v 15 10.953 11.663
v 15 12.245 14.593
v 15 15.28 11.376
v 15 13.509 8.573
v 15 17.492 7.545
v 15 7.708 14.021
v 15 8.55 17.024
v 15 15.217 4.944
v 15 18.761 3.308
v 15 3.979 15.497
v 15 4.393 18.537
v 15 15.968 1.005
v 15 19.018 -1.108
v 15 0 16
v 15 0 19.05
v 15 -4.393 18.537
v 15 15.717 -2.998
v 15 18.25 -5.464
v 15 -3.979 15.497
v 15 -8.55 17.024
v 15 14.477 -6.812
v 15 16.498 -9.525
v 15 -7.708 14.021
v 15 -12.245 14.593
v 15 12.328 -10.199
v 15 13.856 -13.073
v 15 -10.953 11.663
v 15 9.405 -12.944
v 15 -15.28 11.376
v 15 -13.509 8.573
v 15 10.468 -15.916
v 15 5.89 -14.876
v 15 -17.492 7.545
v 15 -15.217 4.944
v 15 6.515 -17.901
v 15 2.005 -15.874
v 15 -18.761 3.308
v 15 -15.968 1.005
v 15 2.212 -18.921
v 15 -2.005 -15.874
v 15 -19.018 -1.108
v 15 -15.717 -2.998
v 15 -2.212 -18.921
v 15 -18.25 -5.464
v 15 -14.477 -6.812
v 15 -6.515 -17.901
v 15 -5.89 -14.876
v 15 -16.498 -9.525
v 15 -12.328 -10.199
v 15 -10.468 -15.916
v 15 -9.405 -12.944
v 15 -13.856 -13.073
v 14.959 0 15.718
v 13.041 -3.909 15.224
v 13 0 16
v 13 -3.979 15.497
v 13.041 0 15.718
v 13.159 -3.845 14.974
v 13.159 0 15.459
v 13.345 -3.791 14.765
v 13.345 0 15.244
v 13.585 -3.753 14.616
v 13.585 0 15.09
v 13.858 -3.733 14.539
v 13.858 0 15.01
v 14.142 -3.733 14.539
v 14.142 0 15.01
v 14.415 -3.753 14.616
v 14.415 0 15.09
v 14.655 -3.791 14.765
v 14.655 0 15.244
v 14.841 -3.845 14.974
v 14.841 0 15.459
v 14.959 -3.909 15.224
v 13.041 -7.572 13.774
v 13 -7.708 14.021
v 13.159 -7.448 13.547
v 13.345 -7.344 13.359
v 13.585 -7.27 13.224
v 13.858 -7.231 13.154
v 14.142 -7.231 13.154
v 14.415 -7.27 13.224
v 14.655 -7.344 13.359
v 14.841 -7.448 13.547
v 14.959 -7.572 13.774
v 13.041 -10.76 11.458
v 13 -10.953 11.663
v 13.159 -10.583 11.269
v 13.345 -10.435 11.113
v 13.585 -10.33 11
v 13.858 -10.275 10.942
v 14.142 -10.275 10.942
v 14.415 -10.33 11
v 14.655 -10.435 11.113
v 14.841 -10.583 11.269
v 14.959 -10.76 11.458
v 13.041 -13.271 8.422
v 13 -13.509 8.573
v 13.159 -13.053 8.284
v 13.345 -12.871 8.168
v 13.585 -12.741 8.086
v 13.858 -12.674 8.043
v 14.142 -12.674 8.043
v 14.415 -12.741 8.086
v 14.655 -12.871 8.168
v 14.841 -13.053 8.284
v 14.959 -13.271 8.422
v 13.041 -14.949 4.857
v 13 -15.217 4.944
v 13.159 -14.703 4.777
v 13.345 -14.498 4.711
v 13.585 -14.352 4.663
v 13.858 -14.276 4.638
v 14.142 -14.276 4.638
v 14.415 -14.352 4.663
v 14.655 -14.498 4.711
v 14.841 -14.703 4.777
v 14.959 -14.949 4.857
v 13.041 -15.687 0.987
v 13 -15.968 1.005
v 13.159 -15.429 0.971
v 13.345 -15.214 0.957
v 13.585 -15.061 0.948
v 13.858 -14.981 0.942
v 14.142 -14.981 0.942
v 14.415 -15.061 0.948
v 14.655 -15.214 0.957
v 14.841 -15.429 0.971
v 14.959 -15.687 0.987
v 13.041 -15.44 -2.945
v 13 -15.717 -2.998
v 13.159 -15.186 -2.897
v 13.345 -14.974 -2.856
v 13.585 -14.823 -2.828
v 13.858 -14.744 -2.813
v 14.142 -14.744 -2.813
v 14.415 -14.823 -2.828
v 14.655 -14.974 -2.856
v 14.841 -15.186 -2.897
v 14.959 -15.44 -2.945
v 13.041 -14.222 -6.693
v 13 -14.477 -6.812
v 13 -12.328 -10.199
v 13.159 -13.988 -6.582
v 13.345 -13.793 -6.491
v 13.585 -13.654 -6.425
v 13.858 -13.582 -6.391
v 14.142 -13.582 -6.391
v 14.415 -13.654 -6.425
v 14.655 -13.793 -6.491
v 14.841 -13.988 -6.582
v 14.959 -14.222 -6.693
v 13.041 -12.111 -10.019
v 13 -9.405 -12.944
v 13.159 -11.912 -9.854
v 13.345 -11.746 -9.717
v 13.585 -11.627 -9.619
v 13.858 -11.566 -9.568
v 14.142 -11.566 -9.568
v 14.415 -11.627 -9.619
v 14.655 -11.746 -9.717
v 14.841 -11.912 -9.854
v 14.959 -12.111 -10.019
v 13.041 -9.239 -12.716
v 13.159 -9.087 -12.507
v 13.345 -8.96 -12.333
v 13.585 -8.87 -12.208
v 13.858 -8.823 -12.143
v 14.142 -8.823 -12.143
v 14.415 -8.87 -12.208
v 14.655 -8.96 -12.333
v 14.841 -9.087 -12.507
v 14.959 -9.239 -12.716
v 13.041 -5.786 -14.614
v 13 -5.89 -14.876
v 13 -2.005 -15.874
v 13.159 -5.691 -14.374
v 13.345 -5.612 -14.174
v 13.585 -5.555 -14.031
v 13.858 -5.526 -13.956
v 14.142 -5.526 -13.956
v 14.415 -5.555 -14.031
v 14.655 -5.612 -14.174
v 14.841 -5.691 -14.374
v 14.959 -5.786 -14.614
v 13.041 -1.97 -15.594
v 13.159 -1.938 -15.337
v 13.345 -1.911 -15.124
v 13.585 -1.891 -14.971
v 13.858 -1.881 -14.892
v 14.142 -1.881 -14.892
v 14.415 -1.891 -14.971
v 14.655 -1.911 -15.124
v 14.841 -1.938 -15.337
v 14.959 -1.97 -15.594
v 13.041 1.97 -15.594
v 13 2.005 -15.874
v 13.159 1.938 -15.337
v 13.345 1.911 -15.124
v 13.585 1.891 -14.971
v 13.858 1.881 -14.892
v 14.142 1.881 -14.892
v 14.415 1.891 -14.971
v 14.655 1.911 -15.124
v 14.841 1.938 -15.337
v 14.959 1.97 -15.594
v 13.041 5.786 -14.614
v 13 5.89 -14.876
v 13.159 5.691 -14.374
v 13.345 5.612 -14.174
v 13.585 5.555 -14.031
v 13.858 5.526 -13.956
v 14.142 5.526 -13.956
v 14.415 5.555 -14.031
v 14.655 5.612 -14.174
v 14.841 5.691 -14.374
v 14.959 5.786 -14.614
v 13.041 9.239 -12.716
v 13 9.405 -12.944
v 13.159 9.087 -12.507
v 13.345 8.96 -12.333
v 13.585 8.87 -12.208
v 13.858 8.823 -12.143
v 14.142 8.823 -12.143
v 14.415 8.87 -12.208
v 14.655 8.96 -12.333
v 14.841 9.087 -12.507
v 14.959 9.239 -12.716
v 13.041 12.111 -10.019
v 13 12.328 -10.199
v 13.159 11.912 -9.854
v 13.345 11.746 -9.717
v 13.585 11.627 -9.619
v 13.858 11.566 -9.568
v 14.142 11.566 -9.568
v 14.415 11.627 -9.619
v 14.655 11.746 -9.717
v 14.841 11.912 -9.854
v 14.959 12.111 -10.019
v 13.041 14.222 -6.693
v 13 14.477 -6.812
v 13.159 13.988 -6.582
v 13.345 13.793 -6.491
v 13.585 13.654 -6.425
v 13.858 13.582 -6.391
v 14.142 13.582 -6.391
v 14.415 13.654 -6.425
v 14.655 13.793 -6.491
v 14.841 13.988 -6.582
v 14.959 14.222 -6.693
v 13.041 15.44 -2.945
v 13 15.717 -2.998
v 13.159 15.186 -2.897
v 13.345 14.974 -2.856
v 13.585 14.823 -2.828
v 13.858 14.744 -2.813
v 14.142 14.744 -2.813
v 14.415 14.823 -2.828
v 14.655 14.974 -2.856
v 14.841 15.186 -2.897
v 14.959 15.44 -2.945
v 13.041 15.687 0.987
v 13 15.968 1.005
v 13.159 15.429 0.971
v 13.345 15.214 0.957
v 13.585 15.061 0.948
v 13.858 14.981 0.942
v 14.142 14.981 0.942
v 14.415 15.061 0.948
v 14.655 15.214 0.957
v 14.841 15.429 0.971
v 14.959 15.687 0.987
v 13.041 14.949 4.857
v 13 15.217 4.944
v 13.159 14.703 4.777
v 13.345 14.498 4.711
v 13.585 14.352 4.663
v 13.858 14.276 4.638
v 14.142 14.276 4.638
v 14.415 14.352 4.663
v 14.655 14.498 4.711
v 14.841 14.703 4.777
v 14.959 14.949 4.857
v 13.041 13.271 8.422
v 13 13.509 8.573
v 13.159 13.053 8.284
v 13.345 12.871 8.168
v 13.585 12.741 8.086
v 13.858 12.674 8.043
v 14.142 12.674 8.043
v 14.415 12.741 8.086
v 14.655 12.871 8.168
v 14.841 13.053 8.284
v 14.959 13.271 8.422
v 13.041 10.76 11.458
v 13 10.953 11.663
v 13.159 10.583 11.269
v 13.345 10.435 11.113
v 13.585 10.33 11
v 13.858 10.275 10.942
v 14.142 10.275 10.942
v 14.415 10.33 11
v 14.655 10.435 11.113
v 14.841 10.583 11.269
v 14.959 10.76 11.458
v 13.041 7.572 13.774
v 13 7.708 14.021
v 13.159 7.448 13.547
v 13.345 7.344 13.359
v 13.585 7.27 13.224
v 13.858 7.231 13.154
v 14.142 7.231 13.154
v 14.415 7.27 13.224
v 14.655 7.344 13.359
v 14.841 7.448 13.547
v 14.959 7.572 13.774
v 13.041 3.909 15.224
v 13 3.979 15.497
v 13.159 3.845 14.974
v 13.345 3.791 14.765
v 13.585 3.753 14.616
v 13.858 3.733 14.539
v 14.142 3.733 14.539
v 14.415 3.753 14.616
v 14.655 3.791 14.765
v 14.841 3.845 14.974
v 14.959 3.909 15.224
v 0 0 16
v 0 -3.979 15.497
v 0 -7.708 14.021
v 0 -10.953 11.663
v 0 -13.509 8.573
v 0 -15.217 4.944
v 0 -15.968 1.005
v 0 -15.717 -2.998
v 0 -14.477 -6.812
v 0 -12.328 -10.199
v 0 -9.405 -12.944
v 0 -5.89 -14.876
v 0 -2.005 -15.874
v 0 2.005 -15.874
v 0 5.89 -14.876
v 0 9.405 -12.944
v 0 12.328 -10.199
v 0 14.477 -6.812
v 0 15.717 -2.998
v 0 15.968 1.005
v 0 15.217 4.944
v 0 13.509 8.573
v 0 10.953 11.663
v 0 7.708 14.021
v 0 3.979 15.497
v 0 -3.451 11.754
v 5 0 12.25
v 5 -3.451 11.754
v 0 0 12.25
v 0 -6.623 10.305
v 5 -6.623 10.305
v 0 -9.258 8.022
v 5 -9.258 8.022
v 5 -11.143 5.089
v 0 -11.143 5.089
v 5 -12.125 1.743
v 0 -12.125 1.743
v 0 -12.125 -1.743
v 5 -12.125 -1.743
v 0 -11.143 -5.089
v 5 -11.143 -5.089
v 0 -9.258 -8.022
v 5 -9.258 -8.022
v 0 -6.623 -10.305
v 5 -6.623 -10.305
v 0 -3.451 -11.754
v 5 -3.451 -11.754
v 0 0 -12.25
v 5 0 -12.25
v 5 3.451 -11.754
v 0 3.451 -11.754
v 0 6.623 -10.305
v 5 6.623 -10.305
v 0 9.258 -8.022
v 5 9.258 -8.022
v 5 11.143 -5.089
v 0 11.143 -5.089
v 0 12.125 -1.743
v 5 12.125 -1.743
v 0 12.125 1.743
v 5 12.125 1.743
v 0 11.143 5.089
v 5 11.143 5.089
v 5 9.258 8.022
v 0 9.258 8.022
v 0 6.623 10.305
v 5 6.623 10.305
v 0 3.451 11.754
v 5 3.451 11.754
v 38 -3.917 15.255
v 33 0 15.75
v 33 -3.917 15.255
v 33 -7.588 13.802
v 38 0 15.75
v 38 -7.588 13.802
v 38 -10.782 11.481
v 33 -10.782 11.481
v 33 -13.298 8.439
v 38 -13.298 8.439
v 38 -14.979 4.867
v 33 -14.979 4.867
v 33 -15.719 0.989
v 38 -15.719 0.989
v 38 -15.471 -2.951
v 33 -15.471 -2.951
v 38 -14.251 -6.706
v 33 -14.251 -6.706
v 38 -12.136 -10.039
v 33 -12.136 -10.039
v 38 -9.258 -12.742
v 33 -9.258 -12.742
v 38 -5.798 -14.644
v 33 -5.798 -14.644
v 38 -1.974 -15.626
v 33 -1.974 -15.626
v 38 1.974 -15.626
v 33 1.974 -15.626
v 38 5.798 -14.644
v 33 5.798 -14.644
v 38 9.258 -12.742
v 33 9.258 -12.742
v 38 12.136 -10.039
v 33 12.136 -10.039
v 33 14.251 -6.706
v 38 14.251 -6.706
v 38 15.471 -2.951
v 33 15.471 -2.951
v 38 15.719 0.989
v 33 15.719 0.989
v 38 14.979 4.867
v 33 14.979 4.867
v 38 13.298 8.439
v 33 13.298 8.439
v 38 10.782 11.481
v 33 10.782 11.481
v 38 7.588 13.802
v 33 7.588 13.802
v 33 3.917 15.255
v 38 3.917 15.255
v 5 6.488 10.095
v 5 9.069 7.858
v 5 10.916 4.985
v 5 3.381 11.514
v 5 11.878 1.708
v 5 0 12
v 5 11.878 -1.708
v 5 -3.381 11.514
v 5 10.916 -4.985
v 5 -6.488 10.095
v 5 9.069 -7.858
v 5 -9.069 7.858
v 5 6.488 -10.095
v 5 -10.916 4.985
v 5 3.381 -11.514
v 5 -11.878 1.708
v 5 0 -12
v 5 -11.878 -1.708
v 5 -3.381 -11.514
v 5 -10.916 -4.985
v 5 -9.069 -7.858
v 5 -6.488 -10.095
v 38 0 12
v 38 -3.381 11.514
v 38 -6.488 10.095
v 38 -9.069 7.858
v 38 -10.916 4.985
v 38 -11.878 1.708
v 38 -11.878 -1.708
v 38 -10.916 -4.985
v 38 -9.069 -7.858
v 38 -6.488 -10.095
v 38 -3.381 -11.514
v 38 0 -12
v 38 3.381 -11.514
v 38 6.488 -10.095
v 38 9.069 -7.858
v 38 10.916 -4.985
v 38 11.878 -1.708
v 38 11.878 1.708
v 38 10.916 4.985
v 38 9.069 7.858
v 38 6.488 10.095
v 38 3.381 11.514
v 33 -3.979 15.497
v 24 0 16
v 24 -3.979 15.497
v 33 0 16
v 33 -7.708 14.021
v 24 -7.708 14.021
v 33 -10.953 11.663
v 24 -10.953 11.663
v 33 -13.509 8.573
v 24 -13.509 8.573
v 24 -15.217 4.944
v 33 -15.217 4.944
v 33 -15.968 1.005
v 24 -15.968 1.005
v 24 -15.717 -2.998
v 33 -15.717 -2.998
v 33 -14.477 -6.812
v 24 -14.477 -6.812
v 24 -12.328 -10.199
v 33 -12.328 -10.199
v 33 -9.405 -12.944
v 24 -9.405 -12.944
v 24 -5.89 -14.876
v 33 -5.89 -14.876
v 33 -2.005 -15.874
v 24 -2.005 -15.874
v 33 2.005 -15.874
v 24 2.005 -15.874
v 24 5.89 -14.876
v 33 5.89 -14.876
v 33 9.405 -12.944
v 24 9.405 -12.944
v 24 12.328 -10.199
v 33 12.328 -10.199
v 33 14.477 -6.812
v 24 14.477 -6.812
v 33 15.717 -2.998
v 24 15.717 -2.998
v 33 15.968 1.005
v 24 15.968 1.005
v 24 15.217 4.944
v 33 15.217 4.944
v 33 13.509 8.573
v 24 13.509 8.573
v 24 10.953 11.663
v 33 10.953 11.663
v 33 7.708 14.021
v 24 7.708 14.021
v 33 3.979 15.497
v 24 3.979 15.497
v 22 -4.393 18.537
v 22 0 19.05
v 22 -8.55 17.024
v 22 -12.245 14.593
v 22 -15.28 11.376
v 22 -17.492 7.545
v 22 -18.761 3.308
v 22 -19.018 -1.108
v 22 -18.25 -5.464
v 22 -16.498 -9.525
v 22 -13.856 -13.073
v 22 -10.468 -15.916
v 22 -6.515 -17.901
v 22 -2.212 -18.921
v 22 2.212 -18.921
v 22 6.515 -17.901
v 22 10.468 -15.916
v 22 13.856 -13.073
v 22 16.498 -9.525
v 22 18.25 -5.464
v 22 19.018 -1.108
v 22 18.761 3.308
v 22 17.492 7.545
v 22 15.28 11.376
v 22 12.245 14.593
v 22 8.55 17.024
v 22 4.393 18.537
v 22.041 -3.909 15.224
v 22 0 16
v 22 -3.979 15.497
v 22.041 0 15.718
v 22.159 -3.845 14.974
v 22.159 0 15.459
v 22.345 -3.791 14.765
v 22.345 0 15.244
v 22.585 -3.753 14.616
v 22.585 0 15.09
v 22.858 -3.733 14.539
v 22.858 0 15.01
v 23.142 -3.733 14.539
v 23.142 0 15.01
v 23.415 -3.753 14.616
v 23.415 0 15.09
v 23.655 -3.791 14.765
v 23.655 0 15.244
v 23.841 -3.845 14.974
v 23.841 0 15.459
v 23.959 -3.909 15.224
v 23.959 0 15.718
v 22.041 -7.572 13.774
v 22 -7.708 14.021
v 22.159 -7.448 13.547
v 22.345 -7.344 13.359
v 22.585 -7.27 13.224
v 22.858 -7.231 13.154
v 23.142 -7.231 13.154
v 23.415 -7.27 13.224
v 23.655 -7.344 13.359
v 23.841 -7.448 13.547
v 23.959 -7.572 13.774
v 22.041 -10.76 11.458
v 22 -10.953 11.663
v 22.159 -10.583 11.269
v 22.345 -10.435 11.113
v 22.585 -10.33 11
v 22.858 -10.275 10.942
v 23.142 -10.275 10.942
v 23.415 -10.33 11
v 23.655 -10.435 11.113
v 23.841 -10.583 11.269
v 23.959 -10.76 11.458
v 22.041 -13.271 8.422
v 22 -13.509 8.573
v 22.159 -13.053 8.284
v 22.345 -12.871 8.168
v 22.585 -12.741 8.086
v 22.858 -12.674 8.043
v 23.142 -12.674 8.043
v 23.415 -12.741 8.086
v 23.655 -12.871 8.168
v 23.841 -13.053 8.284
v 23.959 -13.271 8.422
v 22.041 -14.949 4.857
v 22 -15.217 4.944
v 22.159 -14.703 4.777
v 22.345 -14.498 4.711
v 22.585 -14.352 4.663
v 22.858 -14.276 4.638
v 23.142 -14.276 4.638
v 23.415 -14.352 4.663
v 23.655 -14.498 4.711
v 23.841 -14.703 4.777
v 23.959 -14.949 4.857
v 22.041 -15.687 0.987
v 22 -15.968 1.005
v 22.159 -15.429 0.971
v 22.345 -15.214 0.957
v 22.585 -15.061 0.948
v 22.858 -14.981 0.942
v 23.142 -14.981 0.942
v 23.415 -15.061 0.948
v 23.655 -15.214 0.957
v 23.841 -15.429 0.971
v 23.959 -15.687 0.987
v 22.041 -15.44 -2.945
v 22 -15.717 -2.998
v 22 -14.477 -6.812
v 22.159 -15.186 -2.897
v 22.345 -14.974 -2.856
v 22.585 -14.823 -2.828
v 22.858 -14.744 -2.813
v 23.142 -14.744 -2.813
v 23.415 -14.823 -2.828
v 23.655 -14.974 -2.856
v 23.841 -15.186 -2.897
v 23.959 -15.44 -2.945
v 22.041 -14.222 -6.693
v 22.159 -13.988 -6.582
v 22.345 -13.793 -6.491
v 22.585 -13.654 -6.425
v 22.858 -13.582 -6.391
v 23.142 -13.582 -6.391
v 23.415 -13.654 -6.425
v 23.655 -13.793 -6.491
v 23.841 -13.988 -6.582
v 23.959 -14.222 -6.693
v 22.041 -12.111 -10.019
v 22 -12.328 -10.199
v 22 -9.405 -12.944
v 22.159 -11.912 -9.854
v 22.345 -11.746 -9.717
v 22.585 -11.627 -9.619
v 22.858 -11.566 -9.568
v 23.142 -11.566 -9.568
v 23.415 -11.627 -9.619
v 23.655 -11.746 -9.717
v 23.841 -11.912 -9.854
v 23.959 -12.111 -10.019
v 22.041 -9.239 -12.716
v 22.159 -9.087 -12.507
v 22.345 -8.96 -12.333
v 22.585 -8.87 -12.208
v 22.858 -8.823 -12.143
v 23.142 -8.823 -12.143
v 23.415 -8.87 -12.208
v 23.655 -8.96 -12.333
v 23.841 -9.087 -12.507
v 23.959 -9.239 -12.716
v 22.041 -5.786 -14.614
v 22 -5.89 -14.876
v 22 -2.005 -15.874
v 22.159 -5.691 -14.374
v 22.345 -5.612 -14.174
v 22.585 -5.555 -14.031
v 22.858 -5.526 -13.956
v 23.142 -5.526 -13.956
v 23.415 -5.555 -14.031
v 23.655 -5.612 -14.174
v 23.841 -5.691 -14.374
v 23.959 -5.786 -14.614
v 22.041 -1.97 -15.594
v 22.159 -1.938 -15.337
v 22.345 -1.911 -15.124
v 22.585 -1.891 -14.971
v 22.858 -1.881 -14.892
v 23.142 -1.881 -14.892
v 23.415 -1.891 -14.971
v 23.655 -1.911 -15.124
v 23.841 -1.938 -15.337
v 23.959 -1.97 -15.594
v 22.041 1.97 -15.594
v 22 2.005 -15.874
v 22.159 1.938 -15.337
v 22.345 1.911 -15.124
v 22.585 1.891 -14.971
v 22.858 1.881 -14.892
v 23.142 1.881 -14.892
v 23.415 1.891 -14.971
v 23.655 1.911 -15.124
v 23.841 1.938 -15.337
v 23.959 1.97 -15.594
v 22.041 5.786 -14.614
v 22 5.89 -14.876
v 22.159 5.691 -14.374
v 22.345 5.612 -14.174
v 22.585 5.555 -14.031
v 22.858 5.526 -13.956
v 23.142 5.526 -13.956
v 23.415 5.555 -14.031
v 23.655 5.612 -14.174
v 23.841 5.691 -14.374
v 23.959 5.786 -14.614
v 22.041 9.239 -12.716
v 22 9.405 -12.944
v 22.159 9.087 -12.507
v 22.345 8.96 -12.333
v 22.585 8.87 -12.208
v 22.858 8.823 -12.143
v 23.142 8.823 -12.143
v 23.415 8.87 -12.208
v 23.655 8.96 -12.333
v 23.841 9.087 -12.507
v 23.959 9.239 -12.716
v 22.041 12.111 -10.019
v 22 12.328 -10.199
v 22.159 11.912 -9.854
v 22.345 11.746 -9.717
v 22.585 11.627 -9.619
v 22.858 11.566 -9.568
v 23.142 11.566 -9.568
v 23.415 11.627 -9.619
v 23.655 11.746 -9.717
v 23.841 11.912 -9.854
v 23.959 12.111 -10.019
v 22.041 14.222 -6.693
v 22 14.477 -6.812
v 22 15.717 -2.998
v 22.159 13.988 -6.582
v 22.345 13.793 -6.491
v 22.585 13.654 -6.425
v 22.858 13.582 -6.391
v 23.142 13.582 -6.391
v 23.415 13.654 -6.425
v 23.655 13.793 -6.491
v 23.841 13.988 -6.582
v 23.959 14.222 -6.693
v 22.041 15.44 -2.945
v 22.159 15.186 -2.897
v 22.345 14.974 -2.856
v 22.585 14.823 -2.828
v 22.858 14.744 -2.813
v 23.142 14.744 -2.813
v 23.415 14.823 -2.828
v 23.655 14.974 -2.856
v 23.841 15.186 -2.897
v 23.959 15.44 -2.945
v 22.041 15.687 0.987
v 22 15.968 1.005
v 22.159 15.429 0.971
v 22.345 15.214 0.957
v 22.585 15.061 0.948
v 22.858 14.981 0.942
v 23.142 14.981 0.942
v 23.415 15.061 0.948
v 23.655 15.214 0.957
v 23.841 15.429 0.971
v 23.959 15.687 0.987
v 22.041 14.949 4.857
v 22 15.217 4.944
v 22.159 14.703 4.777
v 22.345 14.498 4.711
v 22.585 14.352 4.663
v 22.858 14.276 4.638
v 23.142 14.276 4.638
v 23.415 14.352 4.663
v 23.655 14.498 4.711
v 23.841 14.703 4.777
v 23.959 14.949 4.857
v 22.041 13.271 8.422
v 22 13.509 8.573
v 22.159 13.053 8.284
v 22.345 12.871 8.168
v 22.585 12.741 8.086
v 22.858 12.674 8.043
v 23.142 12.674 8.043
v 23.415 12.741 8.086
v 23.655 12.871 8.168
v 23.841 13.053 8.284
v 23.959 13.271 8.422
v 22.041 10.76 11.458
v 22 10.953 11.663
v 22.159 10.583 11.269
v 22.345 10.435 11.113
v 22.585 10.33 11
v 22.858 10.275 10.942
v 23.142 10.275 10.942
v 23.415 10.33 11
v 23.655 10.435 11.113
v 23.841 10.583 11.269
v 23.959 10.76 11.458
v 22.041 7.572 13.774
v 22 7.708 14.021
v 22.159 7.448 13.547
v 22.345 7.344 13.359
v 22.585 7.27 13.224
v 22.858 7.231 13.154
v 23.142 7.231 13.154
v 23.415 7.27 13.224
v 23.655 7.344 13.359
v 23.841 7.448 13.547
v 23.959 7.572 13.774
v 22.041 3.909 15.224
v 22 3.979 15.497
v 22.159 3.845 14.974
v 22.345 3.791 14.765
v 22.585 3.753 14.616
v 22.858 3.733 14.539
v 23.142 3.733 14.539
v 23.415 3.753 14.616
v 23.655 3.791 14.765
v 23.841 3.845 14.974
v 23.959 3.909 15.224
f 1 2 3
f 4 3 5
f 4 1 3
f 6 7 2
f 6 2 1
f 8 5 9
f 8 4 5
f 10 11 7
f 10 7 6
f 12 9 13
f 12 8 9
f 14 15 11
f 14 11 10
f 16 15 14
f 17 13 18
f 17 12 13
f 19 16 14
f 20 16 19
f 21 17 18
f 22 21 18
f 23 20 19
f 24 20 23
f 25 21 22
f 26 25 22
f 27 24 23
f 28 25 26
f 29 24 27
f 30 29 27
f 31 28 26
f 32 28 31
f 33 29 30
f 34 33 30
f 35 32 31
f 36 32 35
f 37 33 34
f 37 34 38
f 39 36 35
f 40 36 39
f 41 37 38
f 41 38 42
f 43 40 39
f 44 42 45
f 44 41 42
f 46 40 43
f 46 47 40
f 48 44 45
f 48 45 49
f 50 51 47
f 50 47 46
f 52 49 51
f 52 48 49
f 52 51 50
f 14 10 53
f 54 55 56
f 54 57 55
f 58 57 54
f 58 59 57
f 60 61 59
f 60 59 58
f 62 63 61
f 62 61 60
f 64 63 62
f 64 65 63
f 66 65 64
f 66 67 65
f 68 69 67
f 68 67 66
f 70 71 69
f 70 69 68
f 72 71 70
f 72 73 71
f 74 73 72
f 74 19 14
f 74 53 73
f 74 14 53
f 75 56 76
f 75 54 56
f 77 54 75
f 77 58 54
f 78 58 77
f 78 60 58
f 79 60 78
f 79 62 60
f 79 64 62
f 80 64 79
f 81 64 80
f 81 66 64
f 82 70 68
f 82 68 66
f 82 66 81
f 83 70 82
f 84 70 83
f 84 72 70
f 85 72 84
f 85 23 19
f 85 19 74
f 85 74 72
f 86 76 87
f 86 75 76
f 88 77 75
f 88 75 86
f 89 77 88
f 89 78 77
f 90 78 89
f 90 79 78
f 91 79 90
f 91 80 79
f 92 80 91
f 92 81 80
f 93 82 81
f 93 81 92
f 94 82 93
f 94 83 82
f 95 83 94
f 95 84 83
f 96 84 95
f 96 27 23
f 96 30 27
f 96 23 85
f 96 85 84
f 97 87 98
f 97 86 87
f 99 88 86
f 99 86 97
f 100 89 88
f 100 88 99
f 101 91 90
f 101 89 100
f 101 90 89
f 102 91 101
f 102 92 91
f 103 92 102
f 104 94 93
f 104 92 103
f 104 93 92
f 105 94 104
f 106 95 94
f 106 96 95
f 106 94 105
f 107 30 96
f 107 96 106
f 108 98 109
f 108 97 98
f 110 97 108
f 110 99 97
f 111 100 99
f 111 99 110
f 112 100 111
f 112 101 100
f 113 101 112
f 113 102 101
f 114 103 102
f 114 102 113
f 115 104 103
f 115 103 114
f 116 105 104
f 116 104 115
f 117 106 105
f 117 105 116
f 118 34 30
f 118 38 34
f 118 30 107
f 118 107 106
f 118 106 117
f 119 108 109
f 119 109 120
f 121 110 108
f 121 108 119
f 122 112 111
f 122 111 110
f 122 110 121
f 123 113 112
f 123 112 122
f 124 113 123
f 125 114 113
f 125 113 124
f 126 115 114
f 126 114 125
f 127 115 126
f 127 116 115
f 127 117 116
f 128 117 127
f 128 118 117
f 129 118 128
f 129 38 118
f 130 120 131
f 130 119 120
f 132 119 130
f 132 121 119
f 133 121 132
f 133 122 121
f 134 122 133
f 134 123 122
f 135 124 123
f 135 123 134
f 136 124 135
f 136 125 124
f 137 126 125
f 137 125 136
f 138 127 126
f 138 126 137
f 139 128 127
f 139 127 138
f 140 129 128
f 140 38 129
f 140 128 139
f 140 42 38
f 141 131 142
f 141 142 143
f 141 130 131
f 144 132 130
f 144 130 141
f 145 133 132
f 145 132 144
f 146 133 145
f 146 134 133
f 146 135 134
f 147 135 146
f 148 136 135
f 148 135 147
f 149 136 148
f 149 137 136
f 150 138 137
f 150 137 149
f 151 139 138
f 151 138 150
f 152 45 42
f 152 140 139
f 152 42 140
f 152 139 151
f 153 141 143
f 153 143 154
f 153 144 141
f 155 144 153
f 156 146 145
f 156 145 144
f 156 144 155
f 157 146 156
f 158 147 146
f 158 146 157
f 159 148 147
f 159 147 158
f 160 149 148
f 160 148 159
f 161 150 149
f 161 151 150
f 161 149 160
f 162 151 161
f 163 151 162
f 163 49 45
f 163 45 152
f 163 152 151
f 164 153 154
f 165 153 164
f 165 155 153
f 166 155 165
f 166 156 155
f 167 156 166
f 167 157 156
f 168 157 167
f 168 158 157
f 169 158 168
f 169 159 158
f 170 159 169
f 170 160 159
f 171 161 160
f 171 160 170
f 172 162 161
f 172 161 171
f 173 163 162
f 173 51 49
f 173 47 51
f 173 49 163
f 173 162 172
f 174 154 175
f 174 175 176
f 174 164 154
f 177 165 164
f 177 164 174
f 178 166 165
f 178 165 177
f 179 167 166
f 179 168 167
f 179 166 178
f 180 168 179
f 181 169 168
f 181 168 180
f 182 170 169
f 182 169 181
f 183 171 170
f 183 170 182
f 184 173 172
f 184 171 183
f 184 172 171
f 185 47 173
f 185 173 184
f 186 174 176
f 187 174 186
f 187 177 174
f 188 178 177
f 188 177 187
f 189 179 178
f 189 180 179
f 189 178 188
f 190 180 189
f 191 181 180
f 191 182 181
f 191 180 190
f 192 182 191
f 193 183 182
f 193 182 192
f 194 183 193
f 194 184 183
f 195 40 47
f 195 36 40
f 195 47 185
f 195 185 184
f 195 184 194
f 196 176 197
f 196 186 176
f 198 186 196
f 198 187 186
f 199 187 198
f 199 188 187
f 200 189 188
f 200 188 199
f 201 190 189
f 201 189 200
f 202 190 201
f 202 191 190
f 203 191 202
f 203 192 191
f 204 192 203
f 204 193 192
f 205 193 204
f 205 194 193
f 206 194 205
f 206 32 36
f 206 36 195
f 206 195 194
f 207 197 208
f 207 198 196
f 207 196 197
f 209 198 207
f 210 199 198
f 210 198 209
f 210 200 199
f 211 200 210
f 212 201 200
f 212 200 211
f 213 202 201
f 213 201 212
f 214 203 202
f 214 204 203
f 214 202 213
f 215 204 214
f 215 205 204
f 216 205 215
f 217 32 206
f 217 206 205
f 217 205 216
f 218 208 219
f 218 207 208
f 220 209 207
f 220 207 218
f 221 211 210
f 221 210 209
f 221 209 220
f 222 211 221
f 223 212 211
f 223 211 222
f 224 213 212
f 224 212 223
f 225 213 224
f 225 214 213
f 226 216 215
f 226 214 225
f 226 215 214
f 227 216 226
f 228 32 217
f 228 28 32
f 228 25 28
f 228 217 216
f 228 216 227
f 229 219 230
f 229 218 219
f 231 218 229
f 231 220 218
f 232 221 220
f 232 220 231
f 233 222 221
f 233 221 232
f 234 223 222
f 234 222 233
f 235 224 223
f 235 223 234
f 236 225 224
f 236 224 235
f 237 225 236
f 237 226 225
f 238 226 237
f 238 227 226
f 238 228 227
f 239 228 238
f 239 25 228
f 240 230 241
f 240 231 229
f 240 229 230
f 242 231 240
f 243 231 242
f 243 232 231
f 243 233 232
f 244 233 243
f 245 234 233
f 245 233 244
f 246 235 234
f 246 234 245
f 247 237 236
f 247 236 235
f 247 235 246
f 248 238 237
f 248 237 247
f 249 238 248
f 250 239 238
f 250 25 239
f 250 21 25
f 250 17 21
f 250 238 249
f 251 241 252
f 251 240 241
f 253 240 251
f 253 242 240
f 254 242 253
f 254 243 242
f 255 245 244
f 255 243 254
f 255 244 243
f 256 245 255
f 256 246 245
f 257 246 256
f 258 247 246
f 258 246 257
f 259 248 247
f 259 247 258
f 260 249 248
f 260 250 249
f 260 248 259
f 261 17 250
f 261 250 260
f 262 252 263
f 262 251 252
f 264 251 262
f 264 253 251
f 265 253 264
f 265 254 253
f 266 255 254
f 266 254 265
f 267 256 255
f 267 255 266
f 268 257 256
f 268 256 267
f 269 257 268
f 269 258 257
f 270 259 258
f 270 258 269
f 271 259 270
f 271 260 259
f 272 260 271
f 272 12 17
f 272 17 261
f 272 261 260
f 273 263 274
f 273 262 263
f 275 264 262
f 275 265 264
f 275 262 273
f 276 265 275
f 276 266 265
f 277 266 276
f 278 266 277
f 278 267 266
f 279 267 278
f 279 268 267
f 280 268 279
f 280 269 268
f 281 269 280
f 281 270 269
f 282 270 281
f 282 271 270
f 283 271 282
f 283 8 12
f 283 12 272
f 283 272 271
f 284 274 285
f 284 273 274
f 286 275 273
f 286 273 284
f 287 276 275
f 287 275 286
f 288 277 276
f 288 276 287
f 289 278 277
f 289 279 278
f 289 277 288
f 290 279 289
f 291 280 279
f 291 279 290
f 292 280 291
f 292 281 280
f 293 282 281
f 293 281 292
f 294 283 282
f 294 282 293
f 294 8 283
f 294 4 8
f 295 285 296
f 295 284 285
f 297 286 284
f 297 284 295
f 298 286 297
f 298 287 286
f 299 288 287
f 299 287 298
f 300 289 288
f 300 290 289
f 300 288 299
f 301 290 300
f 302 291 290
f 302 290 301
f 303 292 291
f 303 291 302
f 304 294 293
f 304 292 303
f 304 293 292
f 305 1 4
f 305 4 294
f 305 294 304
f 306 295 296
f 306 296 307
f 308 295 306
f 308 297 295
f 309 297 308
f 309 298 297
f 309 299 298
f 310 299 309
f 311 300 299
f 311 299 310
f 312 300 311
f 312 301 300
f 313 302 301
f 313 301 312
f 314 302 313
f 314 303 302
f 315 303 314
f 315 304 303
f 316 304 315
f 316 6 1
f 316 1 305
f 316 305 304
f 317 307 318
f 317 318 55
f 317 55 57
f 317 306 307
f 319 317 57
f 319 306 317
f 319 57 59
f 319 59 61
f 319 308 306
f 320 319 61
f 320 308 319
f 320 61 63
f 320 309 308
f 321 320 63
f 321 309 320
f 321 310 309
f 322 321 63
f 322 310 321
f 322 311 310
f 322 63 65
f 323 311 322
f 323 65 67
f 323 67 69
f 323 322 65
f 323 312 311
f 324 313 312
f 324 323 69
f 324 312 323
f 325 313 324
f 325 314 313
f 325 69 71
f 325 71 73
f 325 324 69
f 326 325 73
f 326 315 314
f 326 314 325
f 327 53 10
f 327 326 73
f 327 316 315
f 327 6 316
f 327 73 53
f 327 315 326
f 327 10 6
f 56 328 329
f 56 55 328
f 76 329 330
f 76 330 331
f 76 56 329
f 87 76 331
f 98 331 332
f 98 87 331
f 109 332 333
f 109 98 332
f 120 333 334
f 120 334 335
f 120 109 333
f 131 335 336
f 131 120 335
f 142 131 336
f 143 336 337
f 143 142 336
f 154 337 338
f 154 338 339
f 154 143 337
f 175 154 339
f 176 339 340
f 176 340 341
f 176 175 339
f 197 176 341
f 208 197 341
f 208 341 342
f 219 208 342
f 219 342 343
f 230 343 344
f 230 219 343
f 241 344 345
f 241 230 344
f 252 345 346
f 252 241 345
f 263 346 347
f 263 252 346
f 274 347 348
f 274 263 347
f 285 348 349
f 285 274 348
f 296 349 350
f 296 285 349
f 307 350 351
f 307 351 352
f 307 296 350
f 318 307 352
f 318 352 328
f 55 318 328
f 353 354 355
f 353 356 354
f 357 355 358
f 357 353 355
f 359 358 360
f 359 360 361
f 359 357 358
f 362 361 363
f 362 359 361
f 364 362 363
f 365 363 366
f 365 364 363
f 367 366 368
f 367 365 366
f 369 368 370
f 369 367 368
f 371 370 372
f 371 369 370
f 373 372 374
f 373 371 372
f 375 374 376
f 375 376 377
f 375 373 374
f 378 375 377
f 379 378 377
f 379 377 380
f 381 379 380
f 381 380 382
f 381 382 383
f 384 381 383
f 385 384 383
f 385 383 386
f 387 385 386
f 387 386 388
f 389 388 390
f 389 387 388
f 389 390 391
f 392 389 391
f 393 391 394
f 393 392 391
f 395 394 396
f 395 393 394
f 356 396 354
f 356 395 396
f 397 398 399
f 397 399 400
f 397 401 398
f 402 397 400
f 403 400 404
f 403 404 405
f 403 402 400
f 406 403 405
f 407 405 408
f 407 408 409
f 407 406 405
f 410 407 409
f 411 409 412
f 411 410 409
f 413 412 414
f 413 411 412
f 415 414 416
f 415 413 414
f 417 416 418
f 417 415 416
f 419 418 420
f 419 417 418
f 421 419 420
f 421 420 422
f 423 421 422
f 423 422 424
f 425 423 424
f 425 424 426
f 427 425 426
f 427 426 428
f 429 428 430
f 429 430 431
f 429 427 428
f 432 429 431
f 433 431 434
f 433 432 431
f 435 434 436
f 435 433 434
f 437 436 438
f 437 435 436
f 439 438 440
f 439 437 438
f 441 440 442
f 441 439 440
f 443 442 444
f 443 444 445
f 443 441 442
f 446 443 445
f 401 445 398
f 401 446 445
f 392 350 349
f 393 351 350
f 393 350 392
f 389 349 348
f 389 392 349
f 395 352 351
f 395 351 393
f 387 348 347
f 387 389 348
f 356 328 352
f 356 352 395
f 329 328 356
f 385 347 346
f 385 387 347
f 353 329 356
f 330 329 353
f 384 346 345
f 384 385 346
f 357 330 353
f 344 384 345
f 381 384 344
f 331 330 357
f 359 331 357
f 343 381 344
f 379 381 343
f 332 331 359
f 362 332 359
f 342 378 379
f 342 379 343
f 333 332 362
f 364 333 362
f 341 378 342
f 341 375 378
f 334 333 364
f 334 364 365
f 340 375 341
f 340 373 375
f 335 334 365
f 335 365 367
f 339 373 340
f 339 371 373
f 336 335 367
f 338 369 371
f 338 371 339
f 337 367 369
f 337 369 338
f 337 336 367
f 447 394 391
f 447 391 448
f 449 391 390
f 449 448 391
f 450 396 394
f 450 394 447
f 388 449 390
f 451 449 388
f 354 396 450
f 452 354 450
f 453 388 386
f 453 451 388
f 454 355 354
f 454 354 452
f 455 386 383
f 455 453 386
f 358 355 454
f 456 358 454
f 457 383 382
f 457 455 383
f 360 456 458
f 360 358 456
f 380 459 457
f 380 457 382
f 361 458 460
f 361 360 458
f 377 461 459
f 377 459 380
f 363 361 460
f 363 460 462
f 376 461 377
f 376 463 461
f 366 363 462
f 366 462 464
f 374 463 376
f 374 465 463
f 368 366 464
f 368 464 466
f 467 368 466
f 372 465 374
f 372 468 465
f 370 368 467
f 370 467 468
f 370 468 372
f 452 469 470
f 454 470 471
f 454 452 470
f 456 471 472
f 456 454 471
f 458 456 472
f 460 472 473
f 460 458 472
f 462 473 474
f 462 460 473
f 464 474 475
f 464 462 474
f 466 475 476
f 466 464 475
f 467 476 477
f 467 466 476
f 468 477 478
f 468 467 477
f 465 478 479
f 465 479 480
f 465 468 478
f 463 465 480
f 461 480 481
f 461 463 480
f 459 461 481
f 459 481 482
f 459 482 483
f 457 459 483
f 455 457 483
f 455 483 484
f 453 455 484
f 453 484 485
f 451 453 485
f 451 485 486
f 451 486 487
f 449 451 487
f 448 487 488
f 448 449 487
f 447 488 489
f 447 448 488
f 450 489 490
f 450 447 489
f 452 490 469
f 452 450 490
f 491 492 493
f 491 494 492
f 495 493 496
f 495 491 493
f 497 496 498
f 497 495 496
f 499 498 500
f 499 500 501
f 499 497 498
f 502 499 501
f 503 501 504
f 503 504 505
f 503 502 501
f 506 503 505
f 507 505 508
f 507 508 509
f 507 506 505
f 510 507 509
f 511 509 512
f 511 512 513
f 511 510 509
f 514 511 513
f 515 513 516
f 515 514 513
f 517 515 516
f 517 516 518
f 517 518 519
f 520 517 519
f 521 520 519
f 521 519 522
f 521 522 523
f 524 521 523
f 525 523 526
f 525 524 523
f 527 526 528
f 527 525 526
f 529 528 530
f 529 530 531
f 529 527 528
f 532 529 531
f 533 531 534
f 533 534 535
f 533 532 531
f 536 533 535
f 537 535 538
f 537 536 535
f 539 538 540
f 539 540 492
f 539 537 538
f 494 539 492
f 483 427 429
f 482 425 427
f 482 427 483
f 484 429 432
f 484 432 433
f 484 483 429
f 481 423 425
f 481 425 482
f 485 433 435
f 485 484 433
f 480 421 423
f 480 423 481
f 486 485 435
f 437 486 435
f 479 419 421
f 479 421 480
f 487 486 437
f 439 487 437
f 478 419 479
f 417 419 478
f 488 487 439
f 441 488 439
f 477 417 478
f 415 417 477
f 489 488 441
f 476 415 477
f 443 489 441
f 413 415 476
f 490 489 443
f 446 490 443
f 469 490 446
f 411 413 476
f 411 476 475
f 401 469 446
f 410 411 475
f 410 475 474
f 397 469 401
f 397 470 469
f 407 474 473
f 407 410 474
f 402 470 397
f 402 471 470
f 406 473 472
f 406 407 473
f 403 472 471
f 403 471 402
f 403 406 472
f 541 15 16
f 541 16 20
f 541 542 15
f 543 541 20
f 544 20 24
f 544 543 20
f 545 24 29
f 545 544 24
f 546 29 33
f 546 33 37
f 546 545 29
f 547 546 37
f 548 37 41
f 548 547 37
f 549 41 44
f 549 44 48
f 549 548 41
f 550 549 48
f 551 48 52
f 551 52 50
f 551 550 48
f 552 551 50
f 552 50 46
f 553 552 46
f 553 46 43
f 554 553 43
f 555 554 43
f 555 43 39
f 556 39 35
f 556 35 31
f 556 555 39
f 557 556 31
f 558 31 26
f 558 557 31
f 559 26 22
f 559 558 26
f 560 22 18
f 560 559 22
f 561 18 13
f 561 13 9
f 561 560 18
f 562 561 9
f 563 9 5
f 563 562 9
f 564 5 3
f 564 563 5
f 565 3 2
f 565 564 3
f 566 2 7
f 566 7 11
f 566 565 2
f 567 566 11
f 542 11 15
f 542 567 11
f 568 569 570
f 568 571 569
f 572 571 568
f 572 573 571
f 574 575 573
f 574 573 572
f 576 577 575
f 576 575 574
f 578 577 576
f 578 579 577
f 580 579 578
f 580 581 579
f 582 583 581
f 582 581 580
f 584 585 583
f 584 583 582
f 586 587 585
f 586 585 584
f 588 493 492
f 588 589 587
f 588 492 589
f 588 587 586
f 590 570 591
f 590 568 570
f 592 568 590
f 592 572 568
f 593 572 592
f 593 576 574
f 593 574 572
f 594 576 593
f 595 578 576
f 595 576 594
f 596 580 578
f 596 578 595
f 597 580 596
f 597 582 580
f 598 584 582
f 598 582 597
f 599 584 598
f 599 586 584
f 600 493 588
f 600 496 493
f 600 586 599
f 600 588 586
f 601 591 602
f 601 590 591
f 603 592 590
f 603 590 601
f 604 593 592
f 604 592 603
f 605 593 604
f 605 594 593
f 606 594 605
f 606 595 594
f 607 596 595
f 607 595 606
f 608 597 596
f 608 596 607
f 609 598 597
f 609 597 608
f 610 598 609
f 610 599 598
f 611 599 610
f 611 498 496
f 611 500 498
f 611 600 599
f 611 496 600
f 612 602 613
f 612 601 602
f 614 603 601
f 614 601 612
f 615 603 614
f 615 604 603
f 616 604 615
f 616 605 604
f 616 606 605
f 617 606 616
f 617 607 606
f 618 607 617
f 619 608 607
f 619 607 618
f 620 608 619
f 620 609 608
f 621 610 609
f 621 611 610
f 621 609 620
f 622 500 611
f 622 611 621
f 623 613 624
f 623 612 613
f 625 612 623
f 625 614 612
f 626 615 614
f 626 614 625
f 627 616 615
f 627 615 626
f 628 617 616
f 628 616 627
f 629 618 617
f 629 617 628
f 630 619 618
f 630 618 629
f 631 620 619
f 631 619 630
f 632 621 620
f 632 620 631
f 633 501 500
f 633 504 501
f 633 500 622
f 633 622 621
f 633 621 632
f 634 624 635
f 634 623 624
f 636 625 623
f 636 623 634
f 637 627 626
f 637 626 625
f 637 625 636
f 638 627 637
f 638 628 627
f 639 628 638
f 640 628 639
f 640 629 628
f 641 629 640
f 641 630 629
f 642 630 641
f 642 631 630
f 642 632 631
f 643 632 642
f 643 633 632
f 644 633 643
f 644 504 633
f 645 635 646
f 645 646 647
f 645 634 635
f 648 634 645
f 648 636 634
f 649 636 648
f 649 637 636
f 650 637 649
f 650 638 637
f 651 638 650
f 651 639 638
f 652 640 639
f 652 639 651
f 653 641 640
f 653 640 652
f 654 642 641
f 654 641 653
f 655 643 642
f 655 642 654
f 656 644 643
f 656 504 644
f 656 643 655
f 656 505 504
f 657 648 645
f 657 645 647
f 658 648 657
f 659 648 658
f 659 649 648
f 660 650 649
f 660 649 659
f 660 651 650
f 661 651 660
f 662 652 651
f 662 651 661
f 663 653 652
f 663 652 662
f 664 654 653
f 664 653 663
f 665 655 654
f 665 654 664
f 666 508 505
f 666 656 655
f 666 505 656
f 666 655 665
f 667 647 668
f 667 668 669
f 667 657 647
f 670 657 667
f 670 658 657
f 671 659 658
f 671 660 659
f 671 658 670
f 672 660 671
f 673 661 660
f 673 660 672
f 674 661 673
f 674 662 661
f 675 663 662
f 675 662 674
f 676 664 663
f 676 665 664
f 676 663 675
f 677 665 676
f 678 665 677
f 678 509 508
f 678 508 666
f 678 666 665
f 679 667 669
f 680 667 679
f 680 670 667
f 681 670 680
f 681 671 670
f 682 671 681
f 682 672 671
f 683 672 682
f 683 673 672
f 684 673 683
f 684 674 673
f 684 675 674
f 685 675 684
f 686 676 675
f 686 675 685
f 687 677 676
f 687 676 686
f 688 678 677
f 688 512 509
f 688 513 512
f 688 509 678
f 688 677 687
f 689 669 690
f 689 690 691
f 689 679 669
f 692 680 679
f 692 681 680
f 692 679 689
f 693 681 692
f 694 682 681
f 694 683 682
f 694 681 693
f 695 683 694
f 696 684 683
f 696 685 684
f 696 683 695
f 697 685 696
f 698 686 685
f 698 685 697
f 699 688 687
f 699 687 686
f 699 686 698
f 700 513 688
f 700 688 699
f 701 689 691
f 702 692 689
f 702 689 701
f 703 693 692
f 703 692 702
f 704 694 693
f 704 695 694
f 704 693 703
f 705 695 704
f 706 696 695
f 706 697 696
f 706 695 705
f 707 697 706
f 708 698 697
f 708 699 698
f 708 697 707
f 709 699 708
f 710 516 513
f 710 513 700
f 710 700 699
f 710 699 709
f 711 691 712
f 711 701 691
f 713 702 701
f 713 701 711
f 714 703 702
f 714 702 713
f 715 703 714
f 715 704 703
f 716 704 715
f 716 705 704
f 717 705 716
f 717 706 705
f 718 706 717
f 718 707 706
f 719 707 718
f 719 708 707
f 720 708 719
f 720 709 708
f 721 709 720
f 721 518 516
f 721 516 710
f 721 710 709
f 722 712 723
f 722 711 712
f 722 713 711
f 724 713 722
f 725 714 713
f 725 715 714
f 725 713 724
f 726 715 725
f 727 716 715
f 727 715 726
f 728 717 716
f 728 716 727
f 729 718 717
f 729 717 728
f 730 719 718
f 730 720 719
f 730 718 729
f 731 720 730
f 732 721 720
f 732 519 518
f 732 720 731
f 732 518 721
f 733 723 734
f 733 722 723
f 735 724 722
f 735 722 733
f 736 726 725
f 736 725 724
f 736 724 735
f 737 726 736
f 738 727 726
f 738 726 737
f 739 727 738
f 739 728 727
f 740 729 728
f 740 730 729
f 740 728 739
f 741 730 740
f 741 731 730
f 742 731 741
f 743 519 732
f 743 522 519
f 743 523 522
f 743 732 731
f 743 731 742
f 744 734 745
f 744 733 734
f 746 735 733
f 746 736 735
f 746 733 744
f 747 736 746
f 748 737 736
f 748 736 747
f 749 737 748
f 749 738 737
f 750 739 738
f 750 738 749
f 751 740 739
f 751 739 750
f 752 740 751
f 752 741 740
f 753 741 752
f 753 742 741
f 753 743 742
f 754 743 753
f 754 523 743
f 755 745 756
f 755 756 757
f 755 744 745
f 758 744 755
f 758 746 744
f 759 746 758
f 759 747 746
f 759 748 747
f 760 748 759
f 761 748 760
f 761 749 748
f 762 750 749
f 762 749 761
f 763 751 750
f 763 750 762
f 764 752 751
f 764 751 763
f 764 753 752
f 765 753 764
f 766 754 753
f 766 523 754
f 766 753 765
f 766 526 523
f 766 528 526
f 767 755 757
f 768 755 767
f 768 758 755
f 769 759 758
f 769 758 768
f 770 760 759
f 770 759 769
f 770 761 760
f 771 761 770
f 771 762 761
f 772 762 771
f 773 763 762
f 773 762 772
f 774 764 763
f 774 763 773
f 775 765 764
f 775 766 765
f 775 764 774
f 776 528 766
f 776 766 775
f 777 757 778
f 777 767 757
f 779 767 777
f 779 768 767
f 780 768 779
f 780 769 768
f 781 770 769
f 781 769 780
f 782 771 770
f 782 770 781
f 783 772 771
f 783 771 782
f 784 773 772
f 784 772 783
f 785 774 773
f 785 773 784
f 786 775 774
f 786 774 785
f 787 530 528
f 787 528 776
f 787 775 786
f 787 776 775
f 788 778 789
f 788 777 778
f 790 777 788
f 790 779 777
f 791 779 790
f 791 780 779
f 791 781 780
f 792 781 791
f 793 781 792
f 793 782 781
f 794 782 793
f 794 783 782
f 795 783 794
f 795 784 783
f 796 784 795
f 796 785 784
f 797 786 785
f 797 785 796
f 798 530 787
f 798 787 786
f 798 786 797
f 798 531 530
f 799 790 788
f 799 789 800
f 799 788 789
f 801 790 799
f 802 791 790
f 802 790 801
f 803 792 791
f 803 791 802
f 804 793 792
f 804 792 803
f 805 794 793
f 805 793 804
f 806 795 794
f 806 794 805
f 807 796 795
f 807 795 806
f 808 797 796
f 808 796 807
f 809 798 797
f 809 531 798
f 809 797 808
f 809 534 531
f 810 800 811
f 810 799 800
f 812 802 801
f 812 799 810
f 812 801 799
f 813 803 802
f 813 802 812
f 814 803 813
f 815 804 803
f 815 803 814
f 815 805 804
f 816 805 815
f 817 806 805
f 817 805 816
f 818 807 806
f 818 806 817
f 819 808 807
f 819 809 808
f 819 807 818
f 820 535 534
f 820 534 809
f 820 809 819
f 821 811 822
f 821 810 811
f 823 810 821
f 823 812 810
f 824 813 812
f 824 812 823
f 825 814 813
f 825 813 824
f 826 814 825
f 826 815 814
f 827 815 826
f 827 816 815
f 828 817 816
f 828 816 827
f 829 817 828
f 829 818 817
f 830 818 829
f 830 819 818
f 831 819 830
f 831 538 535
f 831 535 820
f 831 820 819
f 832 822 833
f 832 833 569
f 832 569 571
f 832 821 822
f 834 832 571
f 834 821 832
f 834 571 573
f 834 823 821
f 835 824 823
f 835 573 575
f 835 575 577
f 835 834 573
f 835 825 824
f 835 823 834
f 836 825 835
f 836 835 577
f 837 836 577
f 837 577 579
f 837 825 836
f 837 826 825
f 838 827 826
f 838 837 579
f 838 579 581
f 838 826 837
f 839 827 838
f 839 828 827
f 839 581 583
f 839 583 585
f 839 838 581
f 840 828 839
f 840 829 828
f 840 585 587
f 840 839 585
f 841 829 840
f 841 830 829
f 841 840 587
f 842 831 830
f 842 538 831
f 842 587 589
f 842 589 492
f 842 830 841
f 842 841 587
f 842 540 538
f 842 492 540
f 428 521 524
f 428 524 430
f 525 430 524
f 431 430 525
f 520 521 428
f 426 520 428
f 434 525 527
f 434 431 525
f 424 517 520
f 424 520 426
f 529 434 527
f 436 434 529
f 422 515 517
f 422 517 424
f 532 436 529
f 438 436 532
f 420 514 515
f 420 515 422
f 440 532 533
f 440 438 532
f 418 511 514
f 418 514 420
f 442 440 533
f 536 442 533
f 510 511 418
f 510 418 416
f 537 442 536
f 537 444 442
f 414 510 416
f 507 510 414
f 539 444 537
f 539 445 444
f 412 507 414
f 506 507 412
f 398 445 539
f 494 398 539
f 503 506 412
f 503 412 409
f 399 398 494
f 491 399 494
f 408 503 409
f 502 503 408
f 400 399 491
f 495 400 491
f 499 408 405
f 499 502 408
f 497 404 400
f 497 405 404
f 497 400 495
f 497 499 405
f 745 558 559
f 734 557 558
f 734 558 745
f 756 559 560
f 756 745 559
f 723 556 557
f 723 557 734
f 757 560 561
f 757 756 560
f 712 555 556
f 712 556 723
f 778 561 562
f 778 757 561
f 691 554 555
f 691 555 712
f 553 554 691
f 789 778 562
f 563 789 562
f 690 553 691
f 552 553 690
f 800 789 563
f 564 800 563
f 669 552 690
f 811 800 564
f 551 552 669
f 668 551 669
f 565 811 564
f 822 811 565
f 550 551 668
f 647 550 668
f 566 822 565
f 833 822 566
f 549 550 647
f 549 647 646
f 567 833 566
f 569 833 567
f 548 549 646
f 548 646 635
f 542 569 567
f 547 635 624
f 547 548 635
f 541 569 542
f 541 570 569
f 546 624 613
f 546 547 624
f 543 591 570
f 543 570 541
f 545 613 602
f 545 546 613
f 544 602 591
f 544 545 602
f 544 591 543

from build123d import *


with BuildPart() as part:
    # Esboço1 → Revolução1 (revolve)
    with BuildSketch(Plane.XY, mode=Mode.PRIVATE) as revolu_o1_sk:
        with BuildLine():
            Line((0, 12.25), (0, 16))
            Line((0, 16), (13, 16))
            ThreePointArc((13, 16), (14, 15), (15, 16))
            Line((15, 16), (15, 19.05))
            Line((15, 19.05), (22, 19.05))
            Line((22, 19.05), (22, 16))
            ThreePointArc((22, 16), (23, 15), (24, 16))
            Line((24, 16), (33, 16))
            Line((33, 16), (33, 15.75))
            Line((33, 15.75), (38, 15.75))
            Line((38, 15.75), (38, 12))
            Line((38, 12), (5, 12))
            Line((5, 12), (5, 12.25))
            Line((5, 12.25), (0, 12.25))
        make_face()
    revolve(revolu_o1_sk.sketch.rotate(Axis((-90.616216216, 0, 0), (1, 0, 0)), 90), axis=Axis((-90.616216216, 0, 0), (1, 0, 0)))  # turned: the seam where the file's is


solid = part.part
